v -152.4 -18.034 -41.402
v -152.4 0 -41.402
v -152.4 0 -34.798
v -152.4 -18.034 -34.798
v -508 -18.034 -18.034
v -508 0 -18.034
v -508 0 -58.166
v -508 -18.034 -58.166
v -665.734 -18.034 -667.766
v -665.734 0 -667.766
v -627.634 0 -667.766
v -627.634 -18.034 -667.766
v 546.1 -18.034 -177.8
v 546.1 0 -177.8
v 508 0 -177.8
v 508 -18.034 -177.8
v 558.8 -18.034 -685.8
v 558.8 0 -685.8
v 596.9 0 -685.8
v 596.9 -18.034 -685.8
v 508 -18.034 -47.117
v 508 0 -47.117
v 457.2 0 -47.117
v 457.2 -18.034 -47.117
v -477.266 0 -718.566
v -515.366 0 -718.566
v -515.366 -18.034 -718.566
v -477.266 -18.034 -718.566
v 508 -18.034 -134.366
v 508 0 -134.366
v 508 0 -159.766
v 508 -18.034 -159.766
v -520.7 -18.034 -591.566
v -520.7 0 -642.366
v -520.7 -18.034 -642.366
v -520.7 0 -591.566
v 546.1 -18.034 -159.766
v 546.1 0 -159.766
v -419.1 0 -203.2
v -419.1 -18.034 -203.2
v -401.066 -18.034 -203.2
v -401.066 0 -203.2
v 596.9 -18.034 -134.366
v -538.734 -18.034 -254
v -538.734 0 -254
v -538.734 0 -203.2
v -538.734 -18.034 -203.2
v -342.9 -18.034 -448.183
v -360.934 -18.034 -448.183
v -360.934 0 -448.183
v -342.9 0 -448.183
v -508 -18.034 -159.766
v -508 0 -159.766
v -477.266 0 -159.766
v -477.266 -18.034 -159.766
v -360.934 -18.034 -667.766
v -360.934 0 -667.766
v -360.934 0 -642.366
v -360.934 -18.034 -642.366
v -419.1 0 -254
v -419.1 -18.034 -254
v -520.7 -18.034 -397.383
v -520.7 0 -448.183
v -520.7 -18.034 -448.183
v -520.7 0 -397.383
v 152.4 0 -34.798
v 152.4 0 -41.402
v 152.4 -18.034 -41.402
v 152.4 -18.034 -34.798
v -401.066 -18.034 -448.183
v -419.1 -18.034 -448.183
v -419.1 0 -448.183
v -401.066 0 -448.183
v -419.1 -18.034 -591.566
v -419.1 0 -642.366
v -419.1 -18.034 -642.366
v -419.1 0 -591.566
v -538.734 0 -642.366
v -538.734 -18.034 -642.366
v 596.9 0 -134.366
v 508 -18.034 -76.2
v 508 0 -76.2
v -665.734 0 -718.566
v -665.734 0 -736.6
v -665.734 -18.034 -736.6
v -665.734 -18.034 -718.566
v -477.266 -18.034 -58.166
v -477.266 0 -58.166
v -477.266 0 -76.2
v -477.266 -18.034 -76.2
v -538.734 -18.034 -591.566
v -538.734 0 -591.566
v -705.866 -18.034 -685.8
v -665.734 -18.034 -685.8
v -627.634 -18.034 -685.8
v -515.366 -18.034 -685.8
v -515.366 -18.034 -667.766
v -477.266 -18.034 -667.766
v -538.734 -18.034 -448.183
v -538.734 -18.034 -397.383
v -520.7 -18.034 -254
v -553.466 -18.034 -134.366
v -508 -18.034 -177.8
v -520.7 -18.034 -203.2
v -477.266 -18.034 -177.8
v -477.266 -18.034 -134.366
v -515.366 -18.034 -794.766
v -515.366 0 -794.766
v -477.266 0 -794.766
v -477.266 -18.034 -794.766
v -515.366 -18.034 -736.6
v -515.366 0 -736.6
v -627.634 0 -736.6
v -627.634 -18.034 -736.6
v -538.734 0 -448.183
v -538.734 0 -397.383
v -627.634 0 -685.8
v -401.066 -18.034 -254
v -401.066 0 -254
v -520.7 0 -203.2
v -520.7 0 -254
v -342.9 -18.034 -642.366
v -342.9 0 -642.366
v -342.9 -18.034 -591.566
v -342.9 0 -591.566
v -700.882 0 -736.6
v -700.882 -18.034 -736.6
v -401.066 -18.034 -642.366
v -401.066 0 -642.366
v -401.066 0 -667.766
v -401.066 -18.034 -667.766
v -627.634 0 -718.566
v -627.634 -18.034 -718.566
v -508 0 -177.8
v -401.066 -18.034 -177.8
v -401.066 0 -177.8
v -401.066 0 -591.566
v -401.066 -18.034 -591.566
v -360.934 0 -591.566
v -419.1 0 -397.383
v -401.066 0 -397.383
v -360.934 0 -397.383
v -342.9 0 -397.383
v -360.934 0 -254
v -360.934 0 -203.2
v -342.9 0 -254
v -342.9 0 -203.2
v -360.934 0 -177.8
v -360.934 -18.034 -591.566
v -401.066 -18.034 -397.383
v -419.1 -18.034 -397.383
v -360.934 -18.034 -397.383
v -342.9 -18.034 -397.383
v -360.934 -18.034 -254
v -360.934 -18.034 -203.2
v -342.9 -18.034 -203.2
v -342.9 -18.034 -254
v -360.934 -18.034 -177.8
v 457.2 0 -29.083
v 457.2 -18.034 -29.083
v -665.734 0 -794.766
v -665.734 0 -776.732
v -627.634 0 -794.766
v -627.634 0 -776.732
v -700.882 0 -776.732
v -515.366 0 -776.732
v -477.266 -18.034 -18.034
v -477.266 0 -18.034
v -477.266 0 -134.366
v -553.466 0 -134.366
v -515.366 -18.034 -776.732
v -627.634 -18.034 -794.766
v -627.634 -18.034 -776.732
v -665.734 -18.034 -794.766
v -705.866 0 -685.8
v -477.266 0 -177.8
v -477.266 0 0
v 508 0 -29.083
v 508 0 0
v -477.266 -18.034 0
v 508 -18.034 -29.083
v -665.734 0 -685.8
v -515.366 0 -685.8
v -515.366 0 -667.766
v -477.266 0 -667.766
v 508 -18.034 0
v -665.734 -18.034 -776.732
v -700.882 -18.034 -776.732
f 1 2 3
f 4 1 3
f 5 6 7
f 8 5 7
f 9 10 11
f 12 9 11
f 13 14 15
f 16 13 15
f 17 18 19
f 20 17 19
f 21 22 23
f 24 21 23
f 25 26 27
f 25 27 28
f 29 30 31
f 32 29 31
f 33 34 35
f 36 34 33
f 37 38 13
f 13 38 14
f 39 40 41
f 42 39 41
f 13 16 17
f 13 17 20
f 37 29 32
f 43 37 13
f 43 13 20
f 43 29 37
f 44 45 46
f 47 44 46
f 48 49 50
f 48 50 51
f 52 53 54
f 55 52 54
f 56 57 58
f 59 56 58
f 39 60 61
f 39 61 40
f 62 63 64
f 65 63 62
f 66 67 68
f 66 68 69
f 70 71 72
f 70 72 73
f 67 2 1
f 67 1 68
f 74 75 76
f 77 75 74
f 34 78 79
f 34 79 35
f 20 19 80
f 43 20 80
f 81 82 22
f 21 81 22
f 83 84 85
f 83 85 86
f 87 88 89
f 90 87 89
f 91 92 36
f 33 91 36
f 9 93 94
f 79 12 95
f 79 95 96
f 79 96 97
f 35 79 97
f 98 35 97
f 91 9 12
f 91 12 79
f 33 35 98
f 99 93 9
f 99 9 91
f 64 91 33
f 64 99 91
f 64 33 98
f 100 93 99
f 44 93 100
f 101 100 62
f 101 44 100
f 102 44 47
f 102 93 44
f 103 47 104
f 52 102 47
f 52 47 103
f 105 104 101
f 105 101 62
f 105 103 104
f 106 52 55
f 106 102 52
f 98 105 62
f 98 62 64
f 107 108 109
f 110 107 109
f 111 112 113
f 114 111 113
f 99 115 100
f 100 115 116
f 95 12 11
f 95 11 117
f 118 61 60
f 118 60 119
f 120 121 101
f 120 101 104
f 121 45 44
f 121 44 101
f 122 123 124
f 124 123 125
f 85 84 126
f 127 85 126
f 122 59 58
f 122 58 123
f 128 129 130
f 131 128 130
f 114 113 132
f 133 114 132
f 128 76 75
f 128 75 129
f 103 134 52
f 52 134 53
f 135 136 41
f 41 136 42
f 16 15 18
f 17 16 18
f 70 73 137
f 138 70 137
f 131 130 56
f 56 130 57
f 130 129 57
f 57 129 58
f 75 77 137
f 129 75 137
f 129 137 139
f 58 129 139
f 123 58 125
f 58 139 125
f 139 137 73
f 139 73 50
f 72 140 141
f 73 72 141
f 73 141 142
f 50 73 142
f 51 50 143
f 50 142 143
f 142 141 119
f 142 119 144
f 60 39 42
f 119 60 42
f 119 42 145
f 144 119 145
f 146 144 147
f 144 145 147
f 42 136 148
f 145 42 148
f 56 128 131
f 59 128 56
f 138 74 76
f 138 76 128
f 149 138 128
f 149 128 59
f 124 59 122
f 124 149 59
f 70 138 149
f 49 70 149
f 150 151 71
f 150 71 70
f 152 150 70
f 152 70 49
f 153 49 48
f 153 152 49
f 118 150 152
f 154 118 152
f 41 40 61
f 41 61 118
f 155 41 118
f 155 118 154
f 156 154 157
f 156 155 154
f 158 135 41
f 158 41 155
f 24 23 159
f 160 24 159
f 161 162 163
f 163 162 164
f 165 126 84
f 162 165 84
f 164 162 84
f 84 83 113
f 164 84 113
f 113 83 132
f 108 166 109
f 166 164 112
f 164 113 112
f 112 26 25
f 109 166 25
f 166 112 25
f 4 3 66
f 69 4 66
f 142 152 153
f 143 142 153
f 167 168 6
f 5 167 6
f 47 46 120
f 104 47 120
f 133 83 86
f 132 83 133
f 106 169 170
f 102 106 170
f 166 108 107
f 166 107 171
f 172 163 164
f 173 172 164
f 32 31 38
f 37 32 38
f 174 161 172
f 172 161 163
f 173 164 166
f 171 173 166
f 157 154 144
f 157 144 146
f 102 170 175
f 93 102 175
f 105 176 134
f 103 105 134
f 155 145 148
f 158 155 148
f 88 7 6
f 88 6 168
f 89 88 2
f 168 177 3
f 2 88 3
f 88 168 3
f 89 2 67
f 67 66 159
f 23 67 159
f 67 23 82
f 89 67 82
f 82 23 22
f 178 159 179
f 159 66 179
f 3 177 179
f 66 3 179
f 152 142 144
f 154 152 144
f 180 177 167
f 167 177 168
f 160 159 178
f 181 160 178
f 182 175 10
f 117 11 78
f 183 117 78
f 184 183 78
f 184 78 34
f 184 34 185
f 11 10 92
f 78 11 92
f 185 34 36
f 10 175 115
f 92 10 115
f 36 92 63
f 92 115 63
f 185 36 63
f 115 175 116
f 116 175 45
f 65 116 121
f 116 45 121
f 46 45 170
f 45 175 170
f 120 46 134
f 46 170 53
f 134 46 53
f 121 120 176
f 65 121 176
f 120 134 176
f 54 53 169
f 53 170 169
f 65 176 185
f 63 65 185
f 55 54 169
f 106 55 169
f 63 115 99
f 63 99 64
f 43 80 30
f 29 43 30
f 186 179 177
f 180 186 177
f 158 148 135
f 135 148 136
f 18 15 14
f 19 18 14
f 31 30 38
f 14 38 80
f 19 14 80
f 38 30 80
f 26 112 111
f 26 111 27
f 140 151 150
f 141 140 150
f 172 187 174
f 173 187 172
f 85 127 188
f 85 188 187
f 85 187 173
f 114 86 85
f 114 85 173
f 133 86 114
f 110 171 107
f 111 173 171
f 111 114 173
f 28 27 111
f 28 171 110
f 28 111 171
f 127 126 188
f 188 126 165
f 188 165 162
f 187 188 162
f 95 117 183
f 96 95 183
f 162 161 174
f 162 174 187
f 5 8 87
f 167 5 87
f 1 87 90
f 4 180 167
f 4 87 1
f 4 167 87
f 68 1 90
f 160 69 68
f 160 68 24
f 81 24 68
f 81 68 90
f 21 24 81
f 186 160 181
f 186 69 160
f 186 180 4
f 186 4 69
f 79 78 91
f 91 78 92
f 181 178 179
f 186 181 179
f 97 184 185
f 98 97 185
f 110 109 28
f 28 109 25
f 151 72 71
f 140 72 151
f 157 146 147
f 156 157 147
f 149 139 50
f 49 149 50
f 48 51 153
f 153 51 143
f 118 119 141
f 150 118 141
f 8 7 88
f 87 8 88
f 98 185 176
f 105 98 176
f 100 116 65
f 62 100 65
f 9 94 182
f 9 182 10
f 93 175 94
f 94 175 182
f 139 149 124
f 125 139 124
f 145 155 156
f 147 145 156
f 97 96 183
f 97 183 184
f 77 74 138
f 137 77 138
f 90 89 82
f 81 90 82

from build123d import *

# Parameters (mm, degrees)
F1_W     = 304.8
F1_H     = 6.604
F2_DEPTH = 18.034
F1_W_2   = 18.034
F1_H_2   = 50.8
F1_W_3   = 38.1
F1_H_3   = 18.034


# Not quite as in the source:
# - a variable given as a bare number and used for a length is read in inches; the dataset says mm whatever the document's units were


with BuildPart() as f2:
    # F1 (on Front) → F2 (new body)
    with BuildSketch(Plane.XZ):
        Polygon((508, 0), (-477.266, 0), (-477.266, -18.034), (-508, -18.034), (-508, -58.166), (-477.266, -58.166), (-477.266, -76.2), (508, -76.2), (508, -47.117), (457.2, -47.117), (457.2, -29.083), (508, -29.083), align=None)
        with Locations((0, -38.1)):
            Rectangle(F1_W, F1_H, mode=Mode.SUBTRACT)
    extrude(amount=F2_DEPTH)


with BuildPart() as f2b:
    # F1 (on Front) → F2, piece 2 (new body)
    with BuildSketch(Plane.XZ):
        Polygon((596.9, -685.8), (596.9, -134.366), (508, -134.366), (508, -159.766), (546.1, -159.766), (546.1, -177.8), (508, -177.8), (558.8, -685.8), align=None)
    extrude(amount=F2_DEPTH)


with BuildPart() as f2c:
    # F1 (on Front) → F2, piece 3 (new body)
    with BuildSketch(Plane.XZ):
        Polygon((-477.266, -667.766), (-477.266, -177.8), (-508, -177.8), (-508, -159.766), (-477.266, -159.766), (-477.266, -134.366), (-553.466, -134.366), (-705.866, -685.8), (-665.734, -685.8), (-665.734, -667.766), (-627.634, -667.766), (-627.634, -685.8), (-515.366, -685.8), (-515.366, -667.766), align=None)
        with Locations((-529.717, -616.966)):
            Rectangle(F1_W_2, F1_H_2, mode=Mode.SUBTRACT)
        with Locations((-529.717, -422.783)):
            Rectangle(F1_W_2, F1_H_2, mode=Mode.SUBTRACT)
        with Locations((-529.717, -228.6)):
            Rectangle(F1_W_2, F1_H_2, mode=Mode.SUBTRACT)
    extrude(amount=F2_DEPTH)


with BuildPart() as f2d:
    # F1 (on Front) → F2, piece 4 (new body)
    with BuildSketch(Plane.XZ):
        with Locations((-410.083, -228.6)):
            Rectangle(F1_W_2, F1_H_2)
        with Locations((-351.917, -228.6)):
            Rectangle(F1_W_2, F1_H_2)
        with Locations((-351.917, -422.783)):
            Rectangle(F1_W_2, F1_H_2)
        with Locations((-410.083, -422.783)):
            Rectangle(F1_W_2, F1_H_2)
        with Locations((-410.083, -616.966)):
            Rectangle(F1_W_2, F1_H_2)
        with Locations((-351.917, -616.966)):
            Rectangle(F1_W_2, F1_H_2)
        Polygon((-360.934, -177.8), (-401.066, -177.8), (-401.066, -203.2), (-401.066, -254), (-401.066, -397.383), (-401.066, -448.183), (-401.066, -591.566), (-401.066, -642.366), (-401.066, -667.766), (-360.934, -667.766), (-360.934, -642.366), (-360.934, -591.566), (-360.934, -448.183), (-360.934, -397.383), (-360.934, -254), (-360.934, -203.2), align=None)
    extrude(amount=F2_DEPTH)


with BuildPart() as f2e:
    # F1 (on Front) → F2, piece 5 (new body)
    with BuildSketch(Plane.XZ):
        with Locations((-496.316, -727.583)):
            Rectangle(F1_W_3, F1_H_3)
        Polygon((-665.734, -736.6), (-700.8819373561, -736.6), (-700.8819373561, -776.732), (-665.734, -776.732), (-627.634, -776.732), (-515.366, -776.732), (-477.266, -776.732), (-477.266, -736.6), (-515.366, -736.6), (-627.634, -736.6), align=None)
        with Locations((-496.316, -785.749)):
            Rectangle(F1_W_3, F1_H_3)
        with Locations((-646.684, -727.583)):
            Rectangle(F1_W_3, F1_H_3)
        with Locations((-646.684, -785.749)):
            Rectangle(F1_W_3, F1_H_3)
    extrude(amount=F2_DEPTH)


solid = Compound([f2.part, f2b.part, f2c.part, f2d.part, f2e.part])
